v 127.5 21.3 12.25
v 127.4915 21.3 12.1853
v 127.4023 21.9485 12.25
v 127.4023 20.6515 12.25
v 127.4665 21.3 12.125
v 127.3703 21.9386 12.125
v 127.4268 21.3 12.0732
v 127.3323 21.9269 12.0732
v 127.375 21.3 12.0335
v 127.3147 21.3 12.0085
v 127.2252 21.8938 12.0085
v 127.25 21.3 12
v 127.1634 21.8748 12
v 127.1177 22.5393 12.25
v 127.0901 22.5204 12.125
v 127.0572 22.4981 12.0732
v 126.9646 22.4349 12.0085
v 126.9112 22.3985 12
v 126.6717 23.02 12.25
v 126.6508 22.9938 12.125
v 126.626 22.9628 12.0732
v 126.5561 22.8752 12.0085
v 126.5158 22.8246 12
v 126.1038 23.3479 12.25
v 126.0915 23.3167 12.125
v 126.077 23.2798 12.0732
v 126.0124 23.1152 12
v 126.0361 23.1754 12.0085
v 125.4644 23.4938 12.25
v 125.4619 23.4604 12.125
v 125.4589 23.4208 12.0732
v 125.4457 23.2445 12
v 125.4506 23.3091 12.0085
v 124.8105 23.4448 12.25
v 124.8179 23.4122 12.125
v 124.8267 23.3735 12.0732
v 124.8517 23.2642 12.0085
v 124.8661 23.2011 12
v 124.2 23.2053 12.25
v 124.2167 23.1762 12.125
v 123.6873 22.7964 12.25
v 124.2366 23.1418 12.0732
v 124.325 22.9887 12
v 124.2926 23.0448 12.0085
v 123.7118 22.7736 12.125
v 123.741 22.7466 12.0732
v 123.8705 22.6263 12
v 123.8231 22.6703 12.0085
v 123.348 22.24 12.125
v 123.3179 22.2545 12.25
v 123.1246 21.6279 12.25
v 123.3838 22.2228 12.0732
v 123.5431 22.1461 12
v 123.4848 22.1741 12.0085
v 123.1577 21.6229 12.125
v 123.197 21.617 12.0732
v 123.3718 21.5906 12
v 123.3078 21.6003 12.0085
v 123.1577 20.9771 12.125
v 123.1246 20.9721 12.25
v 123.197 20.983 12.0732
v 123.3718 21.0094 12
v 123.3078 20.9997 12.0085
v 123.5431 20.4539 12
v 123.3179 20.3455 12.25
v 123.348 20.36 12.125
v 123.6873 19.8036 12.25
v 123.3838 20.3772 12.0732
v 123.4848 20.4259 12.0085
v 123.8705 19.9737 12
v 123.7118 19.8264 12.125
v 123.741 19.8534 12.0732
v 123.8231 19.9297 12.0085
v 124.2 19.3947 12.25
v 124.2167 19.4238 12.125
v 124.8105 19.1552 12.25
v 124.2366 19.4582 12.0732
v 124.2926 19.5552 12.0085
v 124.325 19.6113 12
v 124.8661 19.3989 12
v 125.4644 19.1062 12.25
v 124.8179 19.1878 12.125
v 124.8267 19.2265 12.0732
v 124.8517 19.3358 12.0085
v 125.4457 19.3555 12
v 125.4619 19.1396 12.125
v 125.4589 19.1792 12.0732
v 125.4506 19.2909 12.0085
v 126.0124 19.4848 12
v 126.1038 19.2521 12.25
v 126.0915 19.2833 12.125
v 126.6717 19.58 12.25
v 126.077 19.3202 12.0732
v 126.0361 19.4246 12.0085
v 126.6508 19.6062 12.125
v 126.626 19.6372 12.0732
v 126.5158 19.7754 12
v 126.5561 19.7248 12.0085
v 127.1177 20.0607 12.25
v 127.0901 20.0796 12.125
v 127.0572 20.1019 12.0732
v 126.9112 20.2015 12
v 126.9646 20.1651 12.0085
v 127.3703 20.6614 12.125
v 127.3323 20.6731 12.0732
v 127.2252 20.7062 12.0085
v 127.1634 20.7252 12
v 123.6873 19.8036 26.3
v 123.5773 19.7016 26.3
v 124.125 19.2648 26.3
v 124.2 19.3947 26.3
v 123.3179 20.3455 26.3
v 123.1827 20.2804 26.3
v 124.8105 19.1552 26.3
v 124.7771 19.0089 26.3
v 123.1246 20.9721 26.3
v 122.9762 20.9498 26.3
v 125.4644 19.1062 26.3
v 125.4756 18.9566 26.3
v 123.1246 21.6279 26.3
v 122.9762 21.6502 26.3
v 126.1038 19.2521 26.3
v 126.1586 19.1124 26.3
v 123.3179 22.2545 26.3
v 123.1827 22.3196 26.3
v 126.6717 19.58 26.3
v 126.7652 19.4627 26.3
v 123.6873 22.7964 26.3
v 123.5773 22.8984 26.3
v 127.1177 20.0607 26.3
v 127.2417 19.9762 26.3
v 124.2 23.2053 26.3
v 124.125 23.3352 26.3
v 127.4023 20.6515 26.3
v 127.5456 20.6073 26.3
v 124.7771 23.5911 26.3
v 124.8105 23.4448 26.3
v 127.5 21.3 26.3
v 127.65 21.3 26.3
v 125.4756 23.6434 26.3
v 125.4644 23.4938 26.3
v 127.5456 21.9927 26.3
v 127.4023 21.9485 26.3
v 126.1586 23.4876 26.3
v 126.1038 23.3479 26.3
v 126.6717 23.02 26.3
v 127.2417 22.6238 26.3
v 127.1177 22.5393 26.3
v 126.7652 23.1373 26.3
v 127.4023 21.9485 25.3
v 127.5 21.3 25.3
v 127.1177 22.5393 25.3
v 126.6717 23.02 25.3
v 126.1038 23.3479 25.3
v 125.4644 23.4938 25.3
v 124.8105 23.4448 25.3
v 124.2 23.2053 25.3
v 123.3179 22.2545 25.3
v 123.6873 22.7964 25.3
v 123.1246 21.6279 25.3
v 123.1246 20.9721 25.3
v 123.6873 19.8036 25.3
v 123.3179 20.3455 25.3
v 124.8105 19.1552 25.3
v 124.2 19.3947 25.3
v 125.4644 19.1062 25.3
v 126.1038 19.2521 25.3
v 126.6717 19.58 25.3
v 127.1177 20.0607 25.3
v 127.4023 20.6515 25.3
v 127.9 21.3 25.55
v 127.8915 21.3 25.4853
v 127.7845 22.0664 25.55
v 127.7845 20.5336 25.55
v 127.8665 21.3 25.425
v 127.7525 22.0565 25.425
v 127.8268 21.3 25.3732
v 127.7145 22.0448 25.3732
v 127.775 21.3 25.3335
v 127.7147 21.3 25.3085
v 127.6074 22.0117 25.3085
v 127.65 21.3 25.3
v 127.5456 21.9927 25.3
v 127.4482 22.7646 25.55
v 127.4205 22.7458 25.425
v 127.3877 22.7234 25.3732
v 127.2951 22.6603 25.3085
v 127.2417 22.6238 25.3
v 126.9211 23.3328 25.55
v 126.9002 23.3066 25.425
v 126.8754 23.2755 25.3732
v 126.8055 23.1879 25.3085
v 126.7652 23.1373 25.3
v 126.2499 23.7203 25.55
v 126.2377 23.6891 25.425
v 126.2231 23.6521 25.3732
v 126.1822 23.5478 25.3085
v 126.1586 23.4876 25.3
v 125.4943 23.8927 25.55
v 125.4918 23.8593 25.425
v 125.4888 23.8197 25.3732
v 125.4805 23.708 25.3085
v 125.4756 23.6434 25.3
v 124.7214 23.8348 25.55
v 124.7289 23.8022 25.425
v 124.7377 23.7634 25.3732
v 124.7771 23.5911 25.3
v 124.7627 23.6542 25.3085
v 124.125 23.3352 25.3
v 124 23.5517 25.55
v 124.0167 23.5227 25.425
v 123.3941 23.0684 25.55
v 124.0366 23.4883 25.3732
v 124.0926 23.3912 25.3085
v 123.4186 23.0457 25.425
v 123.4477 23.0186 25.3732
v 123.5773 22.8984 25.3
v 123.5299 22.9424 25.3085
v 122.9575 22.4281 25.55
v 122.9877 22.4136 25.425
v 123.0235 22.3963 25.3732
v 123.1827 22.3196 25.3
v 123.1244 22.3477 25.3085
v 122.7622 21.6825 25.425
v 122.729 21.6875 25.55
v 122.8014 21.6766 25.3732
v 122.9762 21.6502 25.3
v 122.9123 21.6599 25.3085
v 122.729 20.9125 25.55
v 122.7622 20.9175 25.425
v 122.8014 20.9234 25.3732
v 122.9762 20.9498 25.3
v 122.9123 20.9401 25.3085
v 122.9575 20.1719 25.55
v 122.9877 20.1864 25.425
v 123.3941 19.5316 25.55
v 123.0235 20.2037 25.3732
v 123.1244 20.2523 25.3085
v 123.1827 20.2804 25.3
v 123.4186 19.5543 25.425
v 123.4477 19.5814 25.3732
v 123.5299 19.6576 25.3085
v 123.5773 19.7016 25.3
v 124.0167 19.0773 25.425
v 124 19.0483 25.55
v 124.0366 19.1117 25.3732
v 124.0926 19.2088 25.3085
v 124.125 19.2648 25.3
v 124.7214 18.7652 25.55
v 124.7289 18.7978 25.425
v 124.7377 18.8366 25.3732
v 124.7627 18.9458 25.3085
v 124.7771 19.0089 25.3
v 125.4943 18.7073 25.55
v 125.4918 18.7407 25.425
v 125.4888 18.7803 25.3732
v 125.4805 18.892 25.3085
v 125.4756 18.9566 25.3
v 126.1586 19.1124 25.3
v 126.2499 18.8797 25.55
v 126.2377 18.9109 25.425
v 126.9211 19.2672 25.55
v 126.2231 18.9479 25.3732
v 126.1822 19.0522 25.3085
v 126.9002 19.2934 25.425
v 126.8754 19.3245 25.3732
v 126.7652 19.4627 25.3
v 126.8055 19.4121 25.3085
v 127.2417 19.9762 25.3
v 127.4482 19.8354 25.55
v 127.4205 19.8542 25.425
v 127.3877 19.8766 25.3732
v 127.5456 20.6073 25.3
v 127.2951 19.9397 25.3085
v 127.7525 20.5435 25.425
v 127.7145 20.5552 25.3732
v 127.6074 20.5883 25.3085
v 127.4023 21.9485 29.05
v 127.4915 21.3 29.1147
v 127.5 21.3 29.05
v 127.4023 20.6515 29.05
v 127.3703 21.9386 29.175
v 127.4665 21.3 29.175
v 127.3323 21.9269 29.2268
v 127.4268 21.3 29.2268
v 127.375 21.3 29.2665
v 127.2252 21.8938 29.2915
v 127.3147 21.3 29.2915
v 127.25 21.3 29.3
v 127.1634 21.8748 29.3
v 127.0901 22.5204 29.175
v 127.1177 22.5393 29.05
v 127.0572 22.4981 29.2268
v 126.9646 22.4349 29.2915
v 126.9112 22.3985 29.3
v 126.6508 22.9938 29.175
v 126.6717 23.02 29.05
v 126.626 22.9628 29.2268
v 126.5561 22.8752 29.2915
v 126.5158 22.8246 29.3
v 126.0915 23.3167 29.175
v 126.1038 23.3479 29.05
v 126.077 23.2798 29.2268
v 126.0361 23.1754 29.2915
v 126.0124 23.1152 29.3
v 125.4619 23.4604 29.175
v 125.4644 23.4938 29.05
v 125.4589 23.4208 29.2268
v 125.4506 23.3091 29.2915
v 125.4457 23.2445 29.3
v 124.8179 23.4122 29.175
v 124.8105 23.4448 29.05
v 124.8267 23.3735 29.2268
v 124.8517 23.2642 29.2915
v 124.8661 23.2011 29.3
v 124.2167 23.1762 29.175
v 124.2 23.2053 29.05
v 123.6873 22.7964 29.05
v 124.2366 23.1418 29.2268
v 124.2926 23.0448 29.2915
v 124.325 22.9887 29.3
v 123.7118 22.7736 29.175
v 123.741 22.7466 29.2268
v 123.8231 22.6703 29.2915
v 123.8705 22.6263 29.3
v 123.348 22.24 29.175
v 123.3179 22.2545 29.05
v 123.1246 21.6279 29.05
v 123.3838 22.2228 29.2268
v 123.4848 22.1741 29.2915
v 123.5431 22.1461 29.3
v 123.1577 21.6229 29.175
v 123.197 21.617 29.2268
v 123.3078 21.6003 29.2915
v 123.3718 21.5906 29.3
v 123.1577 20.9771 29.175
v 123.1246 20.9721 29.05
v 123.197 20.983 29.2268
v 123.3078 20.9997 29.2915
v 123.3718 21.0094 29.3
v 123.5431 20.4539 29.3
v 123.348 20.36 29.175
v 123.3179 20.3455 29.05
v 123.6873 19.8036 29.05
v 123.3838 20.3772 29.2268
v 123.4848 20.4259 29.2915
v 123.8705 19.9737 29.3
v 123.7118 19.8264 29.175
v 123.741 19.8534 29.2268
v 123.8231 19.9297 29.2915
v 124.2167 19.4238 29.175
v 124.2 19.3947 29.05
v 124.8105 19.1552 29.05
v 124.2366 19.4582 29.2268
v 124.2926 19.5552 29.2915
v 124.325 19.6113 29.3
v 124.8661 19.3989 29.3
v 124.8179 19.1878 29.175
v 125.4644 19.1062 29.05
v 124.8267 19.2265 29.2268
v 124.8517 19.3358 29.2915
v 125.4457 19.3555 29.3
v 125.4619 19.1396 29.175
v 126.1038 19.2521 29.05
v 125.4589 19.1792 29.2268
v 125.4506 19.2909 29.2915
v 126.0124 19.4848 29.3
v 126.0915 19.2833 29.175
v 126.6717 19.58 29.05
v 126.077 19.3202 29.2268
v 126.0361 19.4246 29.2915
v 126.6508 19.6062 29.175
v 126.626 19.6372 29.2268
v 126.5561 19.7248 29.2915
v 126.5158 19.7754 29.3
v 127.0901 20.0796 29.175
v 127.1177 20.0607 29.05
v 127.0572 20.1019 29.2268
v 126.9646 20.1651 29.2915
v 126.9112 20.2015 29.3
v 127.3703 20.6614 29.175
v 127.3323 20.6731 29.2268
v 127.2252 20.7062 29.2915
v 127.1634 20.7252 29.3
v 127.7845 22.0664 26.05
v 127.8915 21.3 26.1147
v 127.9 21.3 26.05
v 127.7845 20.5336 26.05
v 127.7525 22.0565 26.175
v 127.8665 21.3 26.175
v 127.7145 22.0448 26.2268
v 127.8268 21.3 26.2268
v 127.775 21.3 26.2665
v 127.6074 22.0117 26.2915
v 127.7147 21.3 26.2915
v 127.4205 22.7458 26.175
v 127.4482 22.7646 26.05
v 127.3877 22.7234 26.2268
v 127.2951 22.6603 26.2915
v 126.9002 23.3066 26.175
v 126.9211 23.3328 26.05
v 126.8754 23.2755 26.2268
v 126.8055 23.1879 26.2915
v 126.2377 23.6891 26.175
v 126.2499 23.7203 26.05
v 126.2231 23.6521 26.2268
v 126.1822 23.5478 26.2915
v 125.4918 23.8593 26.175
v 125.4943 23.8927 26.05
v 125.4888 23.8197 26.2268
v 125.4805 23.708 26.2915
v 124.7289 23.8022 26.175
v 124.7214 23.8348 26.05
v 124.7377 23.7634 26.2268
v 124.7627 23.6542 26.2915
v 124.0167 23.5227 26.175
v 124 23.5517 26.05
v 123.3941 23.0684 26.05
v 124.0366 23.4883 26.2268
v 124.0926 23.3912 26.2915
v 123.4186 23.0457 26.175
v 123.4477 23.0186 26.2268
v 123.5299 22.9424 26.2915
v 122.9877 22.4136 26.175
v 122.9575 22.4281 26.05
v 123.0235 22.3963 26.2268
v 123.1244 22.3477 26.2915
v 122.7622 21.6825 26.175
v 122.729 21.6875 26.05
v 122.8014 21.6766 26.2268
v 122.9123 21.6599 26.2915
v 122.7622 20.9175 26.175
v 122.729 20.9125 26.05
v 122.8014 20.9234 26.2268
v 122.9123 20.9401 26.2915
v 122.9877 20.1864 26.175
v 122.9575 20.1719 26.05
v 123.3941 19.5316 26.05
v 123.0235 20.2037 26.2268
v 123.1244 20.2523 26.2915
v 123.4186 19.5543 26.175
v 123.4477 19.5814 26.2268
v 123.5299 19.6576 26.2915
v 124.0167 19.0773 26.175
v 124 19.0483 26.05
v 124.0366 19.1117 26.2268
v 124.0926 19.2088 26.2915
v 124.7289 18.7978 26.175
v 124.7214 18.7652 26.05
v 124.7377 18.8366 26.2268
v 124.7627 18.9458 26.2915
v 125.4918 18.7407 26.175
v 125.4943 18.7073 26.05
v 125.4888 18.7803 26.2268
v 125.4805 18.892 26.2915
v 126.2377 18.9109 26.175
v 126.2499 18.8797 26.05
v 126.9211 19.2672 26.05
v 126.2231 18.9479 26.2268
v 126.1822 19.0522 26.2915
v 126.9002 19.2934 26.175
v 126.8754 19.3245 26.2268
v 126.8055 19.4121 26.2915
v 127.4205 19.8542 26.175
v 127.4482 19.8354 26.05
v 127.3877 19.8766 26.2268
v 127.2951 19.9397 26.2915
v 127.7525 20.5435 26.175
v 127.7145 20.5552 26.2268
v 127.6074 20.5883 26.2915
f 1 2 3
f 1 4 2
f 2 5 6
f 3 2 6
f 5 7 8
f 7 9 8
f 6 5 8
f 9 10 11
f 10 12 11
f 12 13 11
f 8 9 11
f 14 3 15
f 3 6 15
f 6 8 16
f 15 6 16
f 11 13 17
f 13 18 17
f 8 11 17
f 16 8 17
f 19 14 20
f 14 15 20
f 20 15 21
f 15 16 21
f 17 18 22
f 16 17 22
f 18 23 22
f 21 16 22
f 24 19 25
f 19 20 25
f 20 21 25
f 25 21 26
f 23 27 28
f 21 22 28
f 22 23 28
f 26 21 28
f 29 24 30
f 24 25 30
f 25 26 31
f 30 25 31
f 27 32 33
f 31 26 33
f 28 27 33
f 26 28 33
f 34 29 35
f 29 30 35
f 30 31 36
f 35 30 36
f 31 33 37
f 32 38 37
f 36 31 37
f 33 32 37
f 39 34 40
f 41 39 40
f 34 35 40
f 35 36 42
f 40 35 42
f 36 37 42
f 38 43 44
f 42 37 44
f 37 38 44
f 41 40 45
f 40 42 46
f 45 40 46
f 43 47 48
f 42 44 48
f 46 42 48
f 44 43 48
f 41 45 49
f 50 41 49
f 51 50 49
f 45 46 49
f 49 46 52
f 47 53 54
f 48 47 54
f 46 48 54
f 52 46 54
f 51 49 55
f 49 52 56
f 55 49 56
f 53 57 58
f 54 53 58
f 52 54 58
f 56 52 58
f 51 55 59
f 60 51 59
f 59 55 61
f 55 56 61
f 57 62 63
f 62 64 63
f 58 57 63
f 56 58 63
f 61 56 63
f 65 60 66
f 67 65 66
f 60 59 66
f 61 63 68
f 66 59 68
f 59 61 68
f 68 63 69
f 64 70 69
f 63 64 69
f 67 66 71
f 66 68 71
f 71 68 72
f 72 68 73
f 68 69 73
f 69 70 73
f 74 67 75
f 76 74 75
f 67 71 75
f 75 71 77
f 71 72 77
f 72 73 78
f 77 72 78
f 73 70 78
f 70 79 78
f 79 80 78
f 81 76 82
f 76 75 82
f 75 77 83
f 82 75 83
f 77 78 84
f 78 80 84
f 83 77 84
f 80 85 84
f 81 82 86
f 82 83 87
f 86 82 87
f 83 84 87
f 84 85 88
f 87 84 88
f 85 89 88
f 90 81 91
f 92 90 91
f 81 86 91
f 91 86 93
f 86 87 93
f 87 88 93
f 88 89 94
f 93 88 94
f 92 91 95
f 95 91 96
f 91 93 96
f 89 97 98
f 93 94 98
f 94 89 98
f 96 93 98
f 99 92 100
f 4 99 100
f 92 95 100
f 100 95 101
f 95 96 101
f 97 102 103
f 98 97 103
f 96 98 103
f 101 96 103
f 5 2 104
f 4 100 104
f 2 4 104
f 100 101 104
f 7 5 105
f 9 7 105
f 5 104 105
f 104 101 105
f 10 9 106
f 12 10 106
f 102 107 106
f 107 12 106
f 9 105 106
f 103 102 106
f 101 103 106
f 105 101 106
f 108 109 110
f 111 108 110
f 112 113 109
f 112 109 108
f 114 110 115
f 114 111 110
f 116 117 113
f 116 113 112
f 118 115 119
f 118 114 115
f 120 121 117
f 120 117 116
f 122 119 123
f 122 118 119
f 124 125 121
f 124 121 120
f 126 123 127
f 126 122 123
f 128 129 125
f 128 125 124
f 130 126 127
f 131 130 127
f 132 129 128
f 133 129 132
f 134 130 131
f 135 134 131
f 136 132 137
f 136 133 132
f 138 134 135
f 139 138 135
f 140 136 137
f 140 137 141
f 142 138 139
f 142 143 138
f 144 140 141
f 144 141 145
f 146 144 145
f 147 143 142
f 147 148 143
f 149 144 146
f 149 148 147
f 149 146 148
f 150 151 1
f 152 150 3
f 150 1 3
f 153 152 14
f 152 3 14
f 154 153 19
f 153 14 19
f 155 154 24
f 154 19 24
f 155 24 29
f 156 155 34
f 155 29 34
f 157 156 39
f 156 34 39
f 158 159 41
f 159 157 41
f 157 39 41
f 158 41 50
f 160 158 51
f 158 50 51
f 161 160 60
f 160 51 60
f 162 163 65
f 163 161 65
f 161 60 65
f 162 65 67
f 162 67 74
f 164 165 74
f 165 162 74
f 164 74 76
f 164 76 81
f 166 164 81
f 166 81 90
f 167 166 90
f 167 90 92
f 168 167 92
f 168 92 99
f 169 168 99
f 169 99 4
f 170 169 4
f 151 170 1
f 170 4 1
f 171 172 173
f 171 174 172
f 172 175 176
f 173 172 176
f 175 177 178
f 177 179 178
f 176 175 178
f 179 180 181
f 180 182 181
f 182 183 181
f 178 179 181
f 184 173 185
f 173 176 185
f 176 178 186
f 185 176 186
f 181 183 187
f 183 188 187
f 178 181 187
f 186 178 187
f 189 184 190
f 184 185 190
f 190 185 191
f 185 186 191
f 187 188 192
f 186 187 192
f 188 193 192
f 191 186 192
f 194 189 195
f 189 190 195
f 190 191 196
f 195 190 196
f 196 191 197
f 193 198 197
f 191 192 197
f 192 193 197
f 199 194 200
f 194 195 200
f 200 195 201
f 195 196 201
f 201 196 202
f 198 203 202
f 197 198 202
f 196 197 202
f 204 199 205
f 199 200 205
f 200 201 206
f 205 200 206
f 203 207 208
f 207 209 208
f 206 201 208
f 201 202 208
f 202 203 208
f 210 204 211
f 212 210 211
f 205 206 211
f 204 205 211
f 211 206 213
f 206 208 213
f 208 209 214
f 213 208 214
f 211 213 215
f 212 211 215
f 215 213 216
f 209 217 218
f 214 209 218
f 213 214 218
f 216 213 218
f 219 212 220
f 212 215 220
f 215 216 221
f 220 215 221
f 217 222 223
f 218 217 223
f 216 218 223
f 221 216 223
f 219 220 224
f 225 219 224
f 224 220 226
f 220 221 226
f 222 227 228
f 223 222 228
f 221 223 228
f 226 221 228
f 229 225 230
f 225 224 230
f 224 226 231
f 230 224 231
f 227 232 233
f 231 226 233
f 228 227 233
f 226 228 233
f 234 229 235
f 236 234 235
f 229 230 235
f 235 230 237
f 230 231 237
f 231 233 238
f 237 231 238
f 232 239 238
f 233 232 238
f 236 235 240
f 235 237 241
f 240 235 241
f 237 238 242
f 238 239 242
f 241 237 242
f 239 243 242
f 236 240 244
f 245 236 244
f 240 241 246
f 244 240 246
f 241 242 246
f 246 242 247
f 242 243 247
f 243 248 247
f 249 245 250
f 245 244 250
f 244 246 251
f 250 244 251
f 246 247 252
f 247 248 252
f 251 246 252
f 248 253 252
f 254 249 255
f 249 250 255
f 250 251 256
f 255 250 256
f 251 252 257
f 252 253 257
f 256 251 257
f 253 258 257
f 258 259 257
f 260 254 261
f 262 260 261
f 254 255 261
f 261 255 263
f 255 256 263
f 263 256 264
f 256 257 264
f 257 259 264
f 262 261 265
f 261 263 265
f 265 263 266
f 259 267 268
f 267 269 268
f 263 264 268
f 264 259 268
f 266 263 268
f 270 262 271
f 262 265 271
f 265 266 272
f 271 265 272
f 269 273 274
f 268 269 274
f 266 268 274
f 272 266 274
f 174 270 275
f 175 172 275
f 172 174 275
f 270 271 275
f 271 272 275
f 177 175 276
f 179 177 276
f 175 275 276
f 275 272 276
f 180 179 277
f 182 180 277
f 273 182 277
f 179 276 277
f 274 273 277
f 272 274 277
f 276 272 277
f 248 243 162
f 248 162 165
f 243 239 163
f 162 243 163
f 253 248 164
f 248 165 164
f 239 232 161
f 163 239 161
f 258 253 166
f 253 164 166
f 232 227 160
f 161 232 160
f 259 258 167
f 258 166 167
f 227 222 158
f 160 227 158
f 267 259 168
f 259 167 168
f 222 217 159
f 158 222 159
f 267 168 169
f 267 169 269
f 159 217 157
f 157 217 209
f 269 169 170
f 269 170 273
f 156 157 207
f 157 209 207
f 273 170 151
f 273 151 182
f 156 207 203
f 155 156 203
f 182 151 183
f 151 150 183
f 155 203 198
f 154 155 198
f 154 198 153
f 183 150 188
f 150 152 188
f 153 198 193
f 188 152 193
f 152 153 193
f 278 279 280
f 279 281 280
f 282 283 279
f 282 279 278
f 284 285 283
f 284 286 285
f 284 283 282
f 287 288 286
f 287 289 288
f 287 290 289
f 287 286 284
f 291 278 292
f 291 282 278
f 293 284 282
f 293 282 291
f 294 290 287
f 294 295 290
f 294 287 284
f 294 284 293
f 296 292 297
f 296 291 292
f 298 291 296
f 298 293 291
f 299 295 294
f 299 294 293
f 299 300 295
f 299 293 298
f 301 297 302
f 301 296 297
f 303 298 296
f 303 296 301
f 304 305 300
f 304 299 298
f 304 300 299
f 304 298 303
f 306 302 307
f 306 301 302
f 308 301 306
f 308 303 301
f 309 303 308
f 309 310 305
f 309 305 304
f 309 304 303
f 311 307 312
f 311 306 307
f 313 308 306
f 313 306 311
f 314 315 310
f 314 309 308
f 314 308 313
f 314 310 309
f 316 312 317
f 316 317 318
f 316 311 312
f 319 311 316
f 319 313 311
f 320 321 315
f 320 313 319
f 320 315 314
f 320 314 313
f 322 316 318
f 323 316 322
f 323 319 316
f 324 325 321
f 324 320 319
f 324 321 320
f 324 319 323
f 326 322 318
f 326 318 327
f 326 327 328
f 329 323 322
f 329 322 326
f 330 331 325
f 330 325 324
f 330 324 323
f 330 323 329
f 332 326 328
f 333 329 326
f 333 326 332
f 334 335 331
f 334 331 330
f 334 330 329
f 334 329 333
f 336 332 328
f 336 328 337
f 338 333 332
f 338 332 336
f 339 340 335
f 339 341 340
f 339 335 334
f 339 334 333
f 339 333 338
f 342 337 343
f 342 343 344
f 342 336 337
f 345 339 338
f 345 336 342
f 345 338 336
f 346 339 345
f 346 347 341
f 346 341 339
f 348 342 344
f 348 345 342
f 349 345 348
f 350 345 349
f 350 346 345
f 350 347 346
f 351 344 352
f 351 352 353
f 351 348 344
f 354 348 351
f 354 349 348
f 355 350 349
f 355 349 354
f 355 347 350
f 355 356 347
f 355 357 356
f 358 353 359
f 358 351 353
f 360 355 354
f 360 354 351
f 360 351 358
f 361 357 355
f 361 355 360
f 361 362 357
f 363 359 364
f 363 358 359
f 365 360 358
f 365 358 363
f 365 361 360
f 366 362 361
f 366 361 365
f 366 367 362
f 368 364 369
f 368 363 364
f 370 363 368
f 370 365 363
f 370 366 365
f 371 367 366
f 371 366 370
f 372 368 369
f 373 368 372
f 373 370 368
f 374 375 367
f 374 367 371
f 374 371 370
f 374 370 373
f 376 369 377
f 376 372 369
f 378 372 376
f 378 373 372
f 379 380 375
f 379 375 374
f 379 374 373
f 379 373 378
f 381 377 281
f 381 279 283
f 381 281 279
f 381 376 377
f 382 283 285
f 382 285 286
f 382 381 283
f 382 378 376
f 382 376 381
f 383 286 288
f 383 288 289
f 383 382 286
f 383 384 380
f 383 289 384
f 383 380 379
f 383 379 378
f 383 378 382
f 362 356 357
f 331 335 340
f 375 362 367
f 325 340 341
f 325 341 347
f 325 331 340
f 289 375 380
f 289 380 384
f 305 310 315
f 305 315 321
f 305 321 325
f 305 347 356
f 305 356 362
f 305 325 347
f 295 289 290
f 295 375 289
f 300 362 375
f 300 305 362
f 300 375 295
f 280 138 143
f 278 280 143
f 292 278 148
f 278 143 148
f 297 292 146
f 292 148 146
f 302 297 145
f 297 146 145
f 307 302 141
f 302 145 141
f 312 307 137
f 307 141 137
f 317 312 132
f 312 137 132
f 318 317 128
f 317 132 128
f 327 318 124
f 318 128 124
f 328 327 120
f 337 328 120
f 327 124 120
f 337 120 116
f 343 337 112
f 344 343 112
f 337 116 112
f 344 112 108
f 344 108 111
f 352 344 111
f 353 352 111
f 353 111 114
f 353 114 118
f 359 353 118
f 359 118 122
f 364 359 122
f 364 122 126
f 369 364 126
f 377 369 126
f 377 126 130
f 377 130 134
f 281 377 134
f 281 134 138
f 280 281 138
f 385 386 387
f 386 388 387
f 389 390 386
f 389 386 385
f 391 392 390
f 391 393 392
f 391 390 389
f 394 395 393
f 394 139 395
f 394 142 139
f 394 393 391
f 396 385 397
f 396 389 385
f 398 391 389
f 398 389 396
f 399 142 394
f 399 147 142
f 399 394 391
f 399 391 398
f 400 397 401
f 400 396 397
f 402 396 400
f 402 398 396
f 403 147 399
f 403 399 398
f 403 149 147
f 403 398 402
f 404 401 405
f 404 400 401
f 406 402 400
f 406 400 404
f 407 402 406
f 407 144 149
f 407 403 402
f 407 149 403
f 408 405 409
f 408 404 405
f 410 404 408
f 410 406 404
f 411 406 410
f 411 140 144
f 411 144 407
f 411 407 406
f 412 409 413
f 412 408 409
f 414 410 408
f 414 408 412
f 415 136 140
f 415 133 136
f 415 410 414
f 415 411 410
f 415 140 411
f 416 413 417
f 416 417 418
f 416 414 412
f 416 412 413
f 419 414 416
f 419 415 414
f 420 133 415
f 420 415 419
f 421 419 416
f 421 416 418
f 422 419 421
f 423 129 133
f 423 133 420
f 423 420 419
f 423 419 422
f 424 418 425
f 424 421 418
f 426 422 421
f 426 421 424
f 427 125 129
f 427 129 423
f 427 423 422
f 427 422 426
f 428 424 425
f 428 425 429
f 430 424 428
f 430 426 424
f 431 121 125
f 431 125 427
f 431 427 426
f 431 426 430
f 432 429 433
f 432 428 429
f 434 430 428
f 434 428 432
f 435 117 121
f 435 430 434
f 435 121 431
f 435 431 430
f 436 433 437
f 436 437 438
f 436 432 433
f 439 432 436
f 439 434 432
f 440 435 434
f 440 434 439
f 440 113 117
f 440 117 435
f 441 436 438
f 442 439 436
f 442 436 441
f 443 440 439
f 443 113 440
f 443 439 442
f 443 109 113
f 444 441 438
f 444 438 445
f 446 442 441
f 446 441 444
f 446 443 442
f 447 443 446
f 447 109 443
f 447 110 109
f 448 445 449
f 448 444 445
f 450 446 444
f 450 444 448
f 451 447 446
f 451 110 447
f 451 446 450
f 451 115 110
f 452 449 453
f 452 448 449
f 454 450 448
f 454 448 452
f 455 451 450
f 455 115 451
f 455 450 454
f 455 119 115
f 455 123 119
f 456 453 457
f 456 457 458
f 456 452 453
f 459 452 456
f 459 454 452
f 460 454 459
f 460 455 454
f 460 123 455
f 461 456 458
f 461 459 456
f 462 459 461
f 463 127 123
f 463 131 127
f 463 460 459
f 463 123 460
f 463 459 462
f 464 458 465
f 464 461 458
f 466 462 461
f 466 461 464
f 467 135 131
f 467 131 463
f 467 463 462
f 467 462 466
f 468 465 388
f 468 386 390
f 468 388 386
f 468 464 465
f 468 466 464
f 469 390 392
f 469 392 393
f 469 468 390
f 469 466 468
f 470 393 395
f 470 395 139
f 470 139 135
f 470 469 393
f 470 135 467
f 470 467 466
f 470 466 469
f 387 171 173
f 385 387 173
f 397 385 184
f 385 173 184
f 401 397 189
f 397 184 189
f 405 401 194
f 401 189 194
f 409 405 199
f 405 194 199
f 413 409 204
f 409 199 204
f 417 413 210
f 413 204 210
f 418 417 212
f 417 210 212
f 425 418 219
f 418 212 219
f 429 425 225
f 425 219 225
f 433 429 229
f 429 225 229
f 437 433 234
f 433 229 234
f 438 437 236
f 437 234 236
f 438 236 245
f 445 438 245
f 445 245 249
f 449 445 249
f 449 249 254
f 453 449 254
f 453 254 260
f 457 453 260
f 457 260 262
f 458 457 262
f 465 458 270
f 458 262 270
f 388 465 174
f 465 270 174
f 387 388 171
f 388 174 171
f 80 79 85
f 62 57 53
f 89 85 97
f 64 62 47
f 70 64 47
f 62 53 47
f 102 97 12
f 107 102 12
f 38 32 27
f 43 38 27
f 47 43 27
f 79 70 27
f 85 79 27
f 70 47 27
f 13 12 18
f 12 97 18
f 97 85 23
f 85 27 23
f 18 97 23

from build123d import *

# Parameters (mm, degrees)
SKETCH040_R       = 2.2
PAD032_DEPTH      = 17.3
CYLINDER002_R     = 2.6
CYLINDER002_DEPTH = 1
FILLET005_R       = 0.25


with BuildPart() as part:
    # Sketch040 → Pad032 (new body)
    with BuildSketch(Plane.XY):
        with Locations((125.3, 21.3)):
            Circle(SKETCH040_R)
    extrude(amount=PAD032_DEPTH)

    # Cylinder002 → Cylinder002 (join)
    with BuildSketch(Plane(origin=(125.3, 21.3, 13.3), x_dir=(1, 0, 0), z_dir=(0, 0, 1))):
        Circle(CYLINDER002_R)
    extrude(amount=CYLINDER002_DEPTH)

    # Fillet005
    fillet005_edges = [part.edges().sort_by_distance(p)[0] for p in [
        (122.7, 21.3, 14.3),
        (122.7, 21.3, 13.3),
        (123.1, 21.3, 17.3),
        (123.1, 21.3, 0),
    ]]
    fillet(fillet005_edges, radius=FILLET005_R)


with BuildPart() as part_1:
    # Body034 placement: moved
    add(part.part.moved(Location((0, 0, 12))))


solid = part_1.part
